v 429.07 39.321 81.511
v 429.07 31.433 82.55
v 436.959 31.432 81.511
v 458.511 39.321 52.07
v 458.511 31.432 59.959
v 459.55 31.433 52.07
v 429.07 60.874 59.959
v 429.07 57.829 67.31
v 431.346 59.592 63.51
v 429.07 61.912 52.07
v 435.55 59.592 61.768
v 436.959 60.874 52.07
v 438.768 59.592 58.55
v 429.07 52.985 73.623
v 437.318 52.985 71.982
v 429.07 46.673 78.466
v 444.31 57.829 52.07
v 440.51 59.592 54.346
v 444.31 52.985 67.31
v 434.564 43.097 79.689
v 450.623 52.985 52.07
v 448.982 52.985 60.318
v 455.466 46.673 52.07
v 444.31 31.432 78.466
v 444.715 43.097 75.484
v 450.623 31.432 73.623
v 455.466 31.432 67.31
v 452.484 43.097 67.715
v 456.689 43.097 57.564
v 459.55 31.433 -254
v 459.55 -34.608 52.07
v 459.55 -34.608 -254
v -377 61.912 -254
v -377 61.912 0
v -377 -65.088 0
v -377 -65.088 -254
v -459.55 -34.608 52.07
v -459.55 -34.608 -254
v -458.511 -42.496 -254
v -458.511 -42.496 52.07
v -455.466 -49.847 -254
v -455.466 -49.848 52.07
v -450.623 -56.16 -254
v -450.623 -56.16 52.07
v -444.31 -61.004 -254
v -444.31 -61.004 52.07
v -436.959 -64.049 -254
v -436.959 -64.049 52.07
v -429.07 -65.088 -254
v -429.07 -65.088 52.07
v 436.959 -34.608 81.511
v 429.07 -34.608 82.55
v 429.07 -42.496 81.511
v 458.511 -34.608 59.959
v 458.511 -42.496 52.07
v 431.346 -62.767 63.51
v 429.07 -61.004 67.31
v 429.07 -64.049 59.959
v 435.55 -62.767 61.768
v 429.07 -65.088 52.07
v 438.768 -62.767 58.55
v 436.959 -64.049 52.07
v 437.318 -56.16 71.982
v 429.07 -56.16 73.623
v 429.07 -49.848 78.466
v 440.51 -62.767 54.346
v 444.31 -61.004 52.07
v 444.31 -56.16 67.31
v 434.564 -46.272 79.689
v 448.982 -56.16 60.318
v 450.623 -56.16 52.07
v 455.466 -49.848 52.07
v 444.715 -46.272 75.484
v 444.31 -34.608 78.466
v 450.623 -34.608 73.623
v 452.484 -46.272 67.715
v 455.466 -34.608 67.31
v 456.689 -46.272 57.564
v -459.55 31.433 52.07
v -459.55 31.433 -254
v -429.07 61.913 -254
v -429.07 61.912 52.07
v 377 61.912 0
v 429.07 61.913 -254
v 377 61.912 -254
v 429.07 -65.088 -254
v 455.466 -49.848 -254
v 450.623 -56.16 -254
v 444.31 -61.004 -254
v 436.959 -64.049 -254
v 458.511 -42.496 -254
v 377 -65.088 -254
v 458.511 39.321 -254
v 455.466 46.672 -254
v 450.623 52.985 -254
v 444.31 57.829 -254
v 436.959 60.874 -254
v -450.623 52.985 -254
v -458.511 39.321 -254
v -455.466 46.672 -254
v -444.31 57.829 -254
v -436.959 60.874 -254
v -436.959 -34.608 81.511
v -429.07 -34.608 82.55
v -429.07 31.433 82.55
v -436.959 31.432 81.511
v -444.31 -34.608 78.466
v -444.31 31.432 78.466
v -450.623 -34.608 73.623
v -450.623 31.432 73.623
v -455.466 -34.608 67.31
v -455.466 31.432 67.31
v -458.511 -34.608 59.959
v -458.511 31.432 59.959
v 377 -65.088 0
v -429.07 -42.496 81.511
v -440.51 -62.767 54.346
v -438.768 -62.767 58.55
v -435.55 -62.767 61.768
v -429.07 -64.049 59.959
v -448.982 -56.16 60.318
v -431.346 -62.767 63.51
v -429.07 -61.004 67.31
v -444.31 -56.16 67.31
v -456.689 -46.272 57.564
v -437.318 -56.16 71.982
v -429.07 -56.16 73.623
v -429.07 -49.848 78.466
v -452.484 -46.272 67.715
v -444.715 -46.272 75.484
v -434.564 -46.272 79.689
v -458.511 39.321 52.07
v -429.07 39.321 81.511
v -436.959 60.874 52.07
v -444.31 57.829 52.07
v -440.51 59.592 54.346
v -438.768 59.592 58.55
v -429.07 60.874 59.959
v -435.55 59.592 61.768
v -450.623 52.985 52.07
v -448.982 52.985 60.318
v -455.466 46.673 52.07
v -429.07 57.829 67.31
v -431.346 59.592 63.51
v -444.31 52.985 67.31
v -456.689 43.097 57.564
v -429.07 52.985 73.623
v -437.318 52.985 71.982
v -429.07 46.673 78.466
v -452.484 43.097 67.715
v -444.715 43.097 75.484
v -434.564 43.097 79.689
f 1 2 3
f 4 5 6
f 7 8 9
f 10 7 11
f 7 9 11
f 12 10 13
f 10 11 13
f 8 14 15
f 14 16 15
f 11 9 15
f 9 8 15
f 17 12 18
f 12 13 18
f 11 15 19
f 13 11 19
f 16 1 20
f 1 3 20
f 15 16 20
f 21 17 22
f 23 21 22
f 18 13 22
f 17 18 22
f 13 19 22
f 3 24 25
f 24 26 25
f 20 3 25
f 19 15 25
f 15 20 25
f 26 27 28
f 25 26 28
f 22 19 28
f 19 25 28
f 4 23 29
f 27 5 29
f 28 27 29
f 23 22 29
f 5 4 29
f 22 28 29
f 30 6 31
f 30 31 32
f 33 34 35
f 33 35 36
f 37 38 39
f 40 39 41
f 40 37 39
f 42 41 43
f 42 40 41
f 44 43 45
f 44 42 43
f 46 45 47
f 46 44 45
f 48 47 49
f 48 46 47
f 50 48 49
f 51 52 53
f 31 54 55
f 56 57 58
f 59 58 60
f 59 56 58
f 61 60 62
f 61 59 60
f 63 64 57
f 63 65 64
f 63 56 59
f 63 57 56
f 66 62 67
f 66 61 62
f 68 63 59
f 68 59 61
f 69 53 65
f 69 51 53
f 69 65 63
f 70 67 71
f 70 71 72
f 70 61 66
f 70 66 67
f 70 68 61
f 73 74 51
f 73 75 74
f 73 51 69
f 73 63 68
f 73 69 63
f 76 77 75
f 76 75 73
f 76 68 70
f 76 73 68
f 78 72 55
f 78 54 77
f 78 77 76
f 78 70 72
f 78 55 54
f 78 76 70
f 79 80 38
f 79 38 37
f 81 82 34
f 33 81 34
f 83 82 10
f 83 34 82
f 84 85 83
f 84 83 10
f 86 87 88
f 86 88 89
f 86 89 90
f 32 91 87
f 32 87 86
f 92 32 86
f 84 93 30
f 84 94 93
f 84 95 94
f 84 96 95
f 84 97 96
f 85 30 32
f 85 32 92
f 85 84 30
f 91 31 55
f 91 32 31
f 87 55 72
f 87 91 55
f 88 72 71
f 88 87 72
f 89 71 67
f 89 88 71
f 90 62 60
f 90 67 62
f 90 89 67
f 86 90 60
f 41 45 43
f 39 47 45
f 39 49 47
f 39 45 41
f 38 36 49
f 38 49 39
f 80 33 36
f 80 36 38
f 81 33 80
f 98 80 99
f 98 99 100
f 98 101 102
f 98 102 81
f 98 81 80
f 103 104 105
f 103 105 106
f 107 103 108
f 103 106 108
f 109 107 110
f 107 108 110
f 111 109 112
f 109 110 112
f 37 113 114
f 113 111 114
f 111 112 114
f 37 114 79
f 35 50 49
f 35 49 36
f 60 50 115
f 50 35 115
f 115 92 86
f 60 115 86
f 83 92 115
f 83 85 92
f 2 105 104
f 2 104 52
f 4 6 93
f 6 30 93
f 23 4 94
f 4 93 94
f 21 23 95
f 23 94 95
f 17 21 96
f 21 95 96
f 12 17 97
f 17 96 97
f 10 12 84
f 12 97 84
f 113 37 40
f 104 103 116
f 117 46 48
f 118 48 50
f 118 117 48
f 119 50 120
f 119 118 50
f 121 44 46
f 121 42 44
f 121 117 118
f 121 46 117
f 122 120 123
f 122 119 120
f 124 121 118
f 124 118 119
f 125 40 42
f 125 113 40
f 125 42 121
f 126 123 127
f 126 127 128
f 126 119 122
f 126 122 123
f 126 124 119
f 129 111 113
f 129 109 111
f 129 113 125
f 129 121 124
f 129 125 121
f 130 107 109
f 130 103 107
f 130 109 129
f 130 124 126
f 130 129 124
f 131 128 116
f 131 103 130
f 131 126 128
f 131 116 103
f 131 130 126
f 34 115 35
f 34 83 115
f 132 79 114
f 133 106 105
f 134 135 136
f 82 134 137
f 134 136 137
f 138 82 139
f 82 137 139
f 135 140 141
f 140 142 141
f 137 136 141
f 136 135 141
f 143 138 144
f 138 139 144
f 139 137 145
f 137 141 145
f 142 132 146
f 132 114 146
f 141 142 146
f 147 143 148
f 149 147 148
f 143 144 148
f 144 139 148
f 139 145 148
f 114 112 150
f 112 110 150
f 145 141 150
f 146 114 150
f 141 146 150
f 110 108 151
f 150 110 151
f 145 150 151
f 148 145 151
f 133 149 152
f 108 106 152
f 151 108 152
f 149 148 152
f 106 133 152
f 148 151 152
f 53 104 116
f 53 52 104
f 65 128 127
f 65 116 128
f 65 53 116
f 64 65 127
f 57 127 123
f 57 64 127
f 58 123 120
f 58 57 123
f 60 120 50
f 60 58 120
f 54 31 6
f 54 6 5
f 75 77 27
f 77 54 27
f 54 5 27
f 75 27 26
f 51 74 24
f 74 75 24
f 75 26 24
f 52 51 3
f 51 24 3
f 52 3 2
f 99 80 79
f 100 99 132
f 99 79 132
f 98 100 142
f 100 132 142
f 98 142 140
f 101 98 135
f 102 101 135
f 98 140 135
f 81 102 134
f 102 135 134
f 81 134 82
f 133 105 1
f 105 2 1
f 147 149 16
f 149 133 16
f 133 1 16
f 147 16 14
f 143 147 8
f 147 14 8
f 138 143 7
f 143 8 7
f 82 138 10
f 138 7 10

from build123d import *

# Parameters (mm, degrees)
BOSS_EXTRUDE1_DEPTH      = 61.9125
BOSS_EXTRUDE1_DEPTH_BACK = 65.0875
FILLET1_R                = 30.48


with BuildPart() as part:
    # Sketch1 → Boss-Extrude1 (new body, two sides)
    with BuildSketch(Plane(origin=(0, 0, 0), x_dir=(1, 0, 0), z_dir=(0, 1, 0))) as boss_extrude1_sk:
        Polygon((376.9999953, 0), (-376.9999953, 0), (-376.9999953, 254), (-459.5499953, 254), (-459.5499953, -82.55), (459.5499953, -82.55), (459.5499953, 254), (376.9999953, 254), align=None)
    extrude(amount=BOSS_EXTRUDE1_DEPTH)
    extrude(boss_extrude1_sk.sketch, amount=-BOSS_EXTRUDE1_DEPTH_BACK)

    # Fillet1
    fillet1_edges = [part.edges().sort_by_distance(p)[0] for p in [
        (459.5499953, -1.5875, 82.55),
        (-459.5499953, -1.5875, 82.55),
        (-459.5499953, -65.0875, -85.725),
        (-459.5499953, 61.9125, -85.725),
        (0, -65.0875, 82.55),
        (0, 61.9125, 82.55),
        (459.5499953, 61.9125, -85.725),
        (459.5499953, -65.0875, -85.725),
    ]]
    fillet(fillet1_edges, radius=FILLET1_R)


solid = part.part
